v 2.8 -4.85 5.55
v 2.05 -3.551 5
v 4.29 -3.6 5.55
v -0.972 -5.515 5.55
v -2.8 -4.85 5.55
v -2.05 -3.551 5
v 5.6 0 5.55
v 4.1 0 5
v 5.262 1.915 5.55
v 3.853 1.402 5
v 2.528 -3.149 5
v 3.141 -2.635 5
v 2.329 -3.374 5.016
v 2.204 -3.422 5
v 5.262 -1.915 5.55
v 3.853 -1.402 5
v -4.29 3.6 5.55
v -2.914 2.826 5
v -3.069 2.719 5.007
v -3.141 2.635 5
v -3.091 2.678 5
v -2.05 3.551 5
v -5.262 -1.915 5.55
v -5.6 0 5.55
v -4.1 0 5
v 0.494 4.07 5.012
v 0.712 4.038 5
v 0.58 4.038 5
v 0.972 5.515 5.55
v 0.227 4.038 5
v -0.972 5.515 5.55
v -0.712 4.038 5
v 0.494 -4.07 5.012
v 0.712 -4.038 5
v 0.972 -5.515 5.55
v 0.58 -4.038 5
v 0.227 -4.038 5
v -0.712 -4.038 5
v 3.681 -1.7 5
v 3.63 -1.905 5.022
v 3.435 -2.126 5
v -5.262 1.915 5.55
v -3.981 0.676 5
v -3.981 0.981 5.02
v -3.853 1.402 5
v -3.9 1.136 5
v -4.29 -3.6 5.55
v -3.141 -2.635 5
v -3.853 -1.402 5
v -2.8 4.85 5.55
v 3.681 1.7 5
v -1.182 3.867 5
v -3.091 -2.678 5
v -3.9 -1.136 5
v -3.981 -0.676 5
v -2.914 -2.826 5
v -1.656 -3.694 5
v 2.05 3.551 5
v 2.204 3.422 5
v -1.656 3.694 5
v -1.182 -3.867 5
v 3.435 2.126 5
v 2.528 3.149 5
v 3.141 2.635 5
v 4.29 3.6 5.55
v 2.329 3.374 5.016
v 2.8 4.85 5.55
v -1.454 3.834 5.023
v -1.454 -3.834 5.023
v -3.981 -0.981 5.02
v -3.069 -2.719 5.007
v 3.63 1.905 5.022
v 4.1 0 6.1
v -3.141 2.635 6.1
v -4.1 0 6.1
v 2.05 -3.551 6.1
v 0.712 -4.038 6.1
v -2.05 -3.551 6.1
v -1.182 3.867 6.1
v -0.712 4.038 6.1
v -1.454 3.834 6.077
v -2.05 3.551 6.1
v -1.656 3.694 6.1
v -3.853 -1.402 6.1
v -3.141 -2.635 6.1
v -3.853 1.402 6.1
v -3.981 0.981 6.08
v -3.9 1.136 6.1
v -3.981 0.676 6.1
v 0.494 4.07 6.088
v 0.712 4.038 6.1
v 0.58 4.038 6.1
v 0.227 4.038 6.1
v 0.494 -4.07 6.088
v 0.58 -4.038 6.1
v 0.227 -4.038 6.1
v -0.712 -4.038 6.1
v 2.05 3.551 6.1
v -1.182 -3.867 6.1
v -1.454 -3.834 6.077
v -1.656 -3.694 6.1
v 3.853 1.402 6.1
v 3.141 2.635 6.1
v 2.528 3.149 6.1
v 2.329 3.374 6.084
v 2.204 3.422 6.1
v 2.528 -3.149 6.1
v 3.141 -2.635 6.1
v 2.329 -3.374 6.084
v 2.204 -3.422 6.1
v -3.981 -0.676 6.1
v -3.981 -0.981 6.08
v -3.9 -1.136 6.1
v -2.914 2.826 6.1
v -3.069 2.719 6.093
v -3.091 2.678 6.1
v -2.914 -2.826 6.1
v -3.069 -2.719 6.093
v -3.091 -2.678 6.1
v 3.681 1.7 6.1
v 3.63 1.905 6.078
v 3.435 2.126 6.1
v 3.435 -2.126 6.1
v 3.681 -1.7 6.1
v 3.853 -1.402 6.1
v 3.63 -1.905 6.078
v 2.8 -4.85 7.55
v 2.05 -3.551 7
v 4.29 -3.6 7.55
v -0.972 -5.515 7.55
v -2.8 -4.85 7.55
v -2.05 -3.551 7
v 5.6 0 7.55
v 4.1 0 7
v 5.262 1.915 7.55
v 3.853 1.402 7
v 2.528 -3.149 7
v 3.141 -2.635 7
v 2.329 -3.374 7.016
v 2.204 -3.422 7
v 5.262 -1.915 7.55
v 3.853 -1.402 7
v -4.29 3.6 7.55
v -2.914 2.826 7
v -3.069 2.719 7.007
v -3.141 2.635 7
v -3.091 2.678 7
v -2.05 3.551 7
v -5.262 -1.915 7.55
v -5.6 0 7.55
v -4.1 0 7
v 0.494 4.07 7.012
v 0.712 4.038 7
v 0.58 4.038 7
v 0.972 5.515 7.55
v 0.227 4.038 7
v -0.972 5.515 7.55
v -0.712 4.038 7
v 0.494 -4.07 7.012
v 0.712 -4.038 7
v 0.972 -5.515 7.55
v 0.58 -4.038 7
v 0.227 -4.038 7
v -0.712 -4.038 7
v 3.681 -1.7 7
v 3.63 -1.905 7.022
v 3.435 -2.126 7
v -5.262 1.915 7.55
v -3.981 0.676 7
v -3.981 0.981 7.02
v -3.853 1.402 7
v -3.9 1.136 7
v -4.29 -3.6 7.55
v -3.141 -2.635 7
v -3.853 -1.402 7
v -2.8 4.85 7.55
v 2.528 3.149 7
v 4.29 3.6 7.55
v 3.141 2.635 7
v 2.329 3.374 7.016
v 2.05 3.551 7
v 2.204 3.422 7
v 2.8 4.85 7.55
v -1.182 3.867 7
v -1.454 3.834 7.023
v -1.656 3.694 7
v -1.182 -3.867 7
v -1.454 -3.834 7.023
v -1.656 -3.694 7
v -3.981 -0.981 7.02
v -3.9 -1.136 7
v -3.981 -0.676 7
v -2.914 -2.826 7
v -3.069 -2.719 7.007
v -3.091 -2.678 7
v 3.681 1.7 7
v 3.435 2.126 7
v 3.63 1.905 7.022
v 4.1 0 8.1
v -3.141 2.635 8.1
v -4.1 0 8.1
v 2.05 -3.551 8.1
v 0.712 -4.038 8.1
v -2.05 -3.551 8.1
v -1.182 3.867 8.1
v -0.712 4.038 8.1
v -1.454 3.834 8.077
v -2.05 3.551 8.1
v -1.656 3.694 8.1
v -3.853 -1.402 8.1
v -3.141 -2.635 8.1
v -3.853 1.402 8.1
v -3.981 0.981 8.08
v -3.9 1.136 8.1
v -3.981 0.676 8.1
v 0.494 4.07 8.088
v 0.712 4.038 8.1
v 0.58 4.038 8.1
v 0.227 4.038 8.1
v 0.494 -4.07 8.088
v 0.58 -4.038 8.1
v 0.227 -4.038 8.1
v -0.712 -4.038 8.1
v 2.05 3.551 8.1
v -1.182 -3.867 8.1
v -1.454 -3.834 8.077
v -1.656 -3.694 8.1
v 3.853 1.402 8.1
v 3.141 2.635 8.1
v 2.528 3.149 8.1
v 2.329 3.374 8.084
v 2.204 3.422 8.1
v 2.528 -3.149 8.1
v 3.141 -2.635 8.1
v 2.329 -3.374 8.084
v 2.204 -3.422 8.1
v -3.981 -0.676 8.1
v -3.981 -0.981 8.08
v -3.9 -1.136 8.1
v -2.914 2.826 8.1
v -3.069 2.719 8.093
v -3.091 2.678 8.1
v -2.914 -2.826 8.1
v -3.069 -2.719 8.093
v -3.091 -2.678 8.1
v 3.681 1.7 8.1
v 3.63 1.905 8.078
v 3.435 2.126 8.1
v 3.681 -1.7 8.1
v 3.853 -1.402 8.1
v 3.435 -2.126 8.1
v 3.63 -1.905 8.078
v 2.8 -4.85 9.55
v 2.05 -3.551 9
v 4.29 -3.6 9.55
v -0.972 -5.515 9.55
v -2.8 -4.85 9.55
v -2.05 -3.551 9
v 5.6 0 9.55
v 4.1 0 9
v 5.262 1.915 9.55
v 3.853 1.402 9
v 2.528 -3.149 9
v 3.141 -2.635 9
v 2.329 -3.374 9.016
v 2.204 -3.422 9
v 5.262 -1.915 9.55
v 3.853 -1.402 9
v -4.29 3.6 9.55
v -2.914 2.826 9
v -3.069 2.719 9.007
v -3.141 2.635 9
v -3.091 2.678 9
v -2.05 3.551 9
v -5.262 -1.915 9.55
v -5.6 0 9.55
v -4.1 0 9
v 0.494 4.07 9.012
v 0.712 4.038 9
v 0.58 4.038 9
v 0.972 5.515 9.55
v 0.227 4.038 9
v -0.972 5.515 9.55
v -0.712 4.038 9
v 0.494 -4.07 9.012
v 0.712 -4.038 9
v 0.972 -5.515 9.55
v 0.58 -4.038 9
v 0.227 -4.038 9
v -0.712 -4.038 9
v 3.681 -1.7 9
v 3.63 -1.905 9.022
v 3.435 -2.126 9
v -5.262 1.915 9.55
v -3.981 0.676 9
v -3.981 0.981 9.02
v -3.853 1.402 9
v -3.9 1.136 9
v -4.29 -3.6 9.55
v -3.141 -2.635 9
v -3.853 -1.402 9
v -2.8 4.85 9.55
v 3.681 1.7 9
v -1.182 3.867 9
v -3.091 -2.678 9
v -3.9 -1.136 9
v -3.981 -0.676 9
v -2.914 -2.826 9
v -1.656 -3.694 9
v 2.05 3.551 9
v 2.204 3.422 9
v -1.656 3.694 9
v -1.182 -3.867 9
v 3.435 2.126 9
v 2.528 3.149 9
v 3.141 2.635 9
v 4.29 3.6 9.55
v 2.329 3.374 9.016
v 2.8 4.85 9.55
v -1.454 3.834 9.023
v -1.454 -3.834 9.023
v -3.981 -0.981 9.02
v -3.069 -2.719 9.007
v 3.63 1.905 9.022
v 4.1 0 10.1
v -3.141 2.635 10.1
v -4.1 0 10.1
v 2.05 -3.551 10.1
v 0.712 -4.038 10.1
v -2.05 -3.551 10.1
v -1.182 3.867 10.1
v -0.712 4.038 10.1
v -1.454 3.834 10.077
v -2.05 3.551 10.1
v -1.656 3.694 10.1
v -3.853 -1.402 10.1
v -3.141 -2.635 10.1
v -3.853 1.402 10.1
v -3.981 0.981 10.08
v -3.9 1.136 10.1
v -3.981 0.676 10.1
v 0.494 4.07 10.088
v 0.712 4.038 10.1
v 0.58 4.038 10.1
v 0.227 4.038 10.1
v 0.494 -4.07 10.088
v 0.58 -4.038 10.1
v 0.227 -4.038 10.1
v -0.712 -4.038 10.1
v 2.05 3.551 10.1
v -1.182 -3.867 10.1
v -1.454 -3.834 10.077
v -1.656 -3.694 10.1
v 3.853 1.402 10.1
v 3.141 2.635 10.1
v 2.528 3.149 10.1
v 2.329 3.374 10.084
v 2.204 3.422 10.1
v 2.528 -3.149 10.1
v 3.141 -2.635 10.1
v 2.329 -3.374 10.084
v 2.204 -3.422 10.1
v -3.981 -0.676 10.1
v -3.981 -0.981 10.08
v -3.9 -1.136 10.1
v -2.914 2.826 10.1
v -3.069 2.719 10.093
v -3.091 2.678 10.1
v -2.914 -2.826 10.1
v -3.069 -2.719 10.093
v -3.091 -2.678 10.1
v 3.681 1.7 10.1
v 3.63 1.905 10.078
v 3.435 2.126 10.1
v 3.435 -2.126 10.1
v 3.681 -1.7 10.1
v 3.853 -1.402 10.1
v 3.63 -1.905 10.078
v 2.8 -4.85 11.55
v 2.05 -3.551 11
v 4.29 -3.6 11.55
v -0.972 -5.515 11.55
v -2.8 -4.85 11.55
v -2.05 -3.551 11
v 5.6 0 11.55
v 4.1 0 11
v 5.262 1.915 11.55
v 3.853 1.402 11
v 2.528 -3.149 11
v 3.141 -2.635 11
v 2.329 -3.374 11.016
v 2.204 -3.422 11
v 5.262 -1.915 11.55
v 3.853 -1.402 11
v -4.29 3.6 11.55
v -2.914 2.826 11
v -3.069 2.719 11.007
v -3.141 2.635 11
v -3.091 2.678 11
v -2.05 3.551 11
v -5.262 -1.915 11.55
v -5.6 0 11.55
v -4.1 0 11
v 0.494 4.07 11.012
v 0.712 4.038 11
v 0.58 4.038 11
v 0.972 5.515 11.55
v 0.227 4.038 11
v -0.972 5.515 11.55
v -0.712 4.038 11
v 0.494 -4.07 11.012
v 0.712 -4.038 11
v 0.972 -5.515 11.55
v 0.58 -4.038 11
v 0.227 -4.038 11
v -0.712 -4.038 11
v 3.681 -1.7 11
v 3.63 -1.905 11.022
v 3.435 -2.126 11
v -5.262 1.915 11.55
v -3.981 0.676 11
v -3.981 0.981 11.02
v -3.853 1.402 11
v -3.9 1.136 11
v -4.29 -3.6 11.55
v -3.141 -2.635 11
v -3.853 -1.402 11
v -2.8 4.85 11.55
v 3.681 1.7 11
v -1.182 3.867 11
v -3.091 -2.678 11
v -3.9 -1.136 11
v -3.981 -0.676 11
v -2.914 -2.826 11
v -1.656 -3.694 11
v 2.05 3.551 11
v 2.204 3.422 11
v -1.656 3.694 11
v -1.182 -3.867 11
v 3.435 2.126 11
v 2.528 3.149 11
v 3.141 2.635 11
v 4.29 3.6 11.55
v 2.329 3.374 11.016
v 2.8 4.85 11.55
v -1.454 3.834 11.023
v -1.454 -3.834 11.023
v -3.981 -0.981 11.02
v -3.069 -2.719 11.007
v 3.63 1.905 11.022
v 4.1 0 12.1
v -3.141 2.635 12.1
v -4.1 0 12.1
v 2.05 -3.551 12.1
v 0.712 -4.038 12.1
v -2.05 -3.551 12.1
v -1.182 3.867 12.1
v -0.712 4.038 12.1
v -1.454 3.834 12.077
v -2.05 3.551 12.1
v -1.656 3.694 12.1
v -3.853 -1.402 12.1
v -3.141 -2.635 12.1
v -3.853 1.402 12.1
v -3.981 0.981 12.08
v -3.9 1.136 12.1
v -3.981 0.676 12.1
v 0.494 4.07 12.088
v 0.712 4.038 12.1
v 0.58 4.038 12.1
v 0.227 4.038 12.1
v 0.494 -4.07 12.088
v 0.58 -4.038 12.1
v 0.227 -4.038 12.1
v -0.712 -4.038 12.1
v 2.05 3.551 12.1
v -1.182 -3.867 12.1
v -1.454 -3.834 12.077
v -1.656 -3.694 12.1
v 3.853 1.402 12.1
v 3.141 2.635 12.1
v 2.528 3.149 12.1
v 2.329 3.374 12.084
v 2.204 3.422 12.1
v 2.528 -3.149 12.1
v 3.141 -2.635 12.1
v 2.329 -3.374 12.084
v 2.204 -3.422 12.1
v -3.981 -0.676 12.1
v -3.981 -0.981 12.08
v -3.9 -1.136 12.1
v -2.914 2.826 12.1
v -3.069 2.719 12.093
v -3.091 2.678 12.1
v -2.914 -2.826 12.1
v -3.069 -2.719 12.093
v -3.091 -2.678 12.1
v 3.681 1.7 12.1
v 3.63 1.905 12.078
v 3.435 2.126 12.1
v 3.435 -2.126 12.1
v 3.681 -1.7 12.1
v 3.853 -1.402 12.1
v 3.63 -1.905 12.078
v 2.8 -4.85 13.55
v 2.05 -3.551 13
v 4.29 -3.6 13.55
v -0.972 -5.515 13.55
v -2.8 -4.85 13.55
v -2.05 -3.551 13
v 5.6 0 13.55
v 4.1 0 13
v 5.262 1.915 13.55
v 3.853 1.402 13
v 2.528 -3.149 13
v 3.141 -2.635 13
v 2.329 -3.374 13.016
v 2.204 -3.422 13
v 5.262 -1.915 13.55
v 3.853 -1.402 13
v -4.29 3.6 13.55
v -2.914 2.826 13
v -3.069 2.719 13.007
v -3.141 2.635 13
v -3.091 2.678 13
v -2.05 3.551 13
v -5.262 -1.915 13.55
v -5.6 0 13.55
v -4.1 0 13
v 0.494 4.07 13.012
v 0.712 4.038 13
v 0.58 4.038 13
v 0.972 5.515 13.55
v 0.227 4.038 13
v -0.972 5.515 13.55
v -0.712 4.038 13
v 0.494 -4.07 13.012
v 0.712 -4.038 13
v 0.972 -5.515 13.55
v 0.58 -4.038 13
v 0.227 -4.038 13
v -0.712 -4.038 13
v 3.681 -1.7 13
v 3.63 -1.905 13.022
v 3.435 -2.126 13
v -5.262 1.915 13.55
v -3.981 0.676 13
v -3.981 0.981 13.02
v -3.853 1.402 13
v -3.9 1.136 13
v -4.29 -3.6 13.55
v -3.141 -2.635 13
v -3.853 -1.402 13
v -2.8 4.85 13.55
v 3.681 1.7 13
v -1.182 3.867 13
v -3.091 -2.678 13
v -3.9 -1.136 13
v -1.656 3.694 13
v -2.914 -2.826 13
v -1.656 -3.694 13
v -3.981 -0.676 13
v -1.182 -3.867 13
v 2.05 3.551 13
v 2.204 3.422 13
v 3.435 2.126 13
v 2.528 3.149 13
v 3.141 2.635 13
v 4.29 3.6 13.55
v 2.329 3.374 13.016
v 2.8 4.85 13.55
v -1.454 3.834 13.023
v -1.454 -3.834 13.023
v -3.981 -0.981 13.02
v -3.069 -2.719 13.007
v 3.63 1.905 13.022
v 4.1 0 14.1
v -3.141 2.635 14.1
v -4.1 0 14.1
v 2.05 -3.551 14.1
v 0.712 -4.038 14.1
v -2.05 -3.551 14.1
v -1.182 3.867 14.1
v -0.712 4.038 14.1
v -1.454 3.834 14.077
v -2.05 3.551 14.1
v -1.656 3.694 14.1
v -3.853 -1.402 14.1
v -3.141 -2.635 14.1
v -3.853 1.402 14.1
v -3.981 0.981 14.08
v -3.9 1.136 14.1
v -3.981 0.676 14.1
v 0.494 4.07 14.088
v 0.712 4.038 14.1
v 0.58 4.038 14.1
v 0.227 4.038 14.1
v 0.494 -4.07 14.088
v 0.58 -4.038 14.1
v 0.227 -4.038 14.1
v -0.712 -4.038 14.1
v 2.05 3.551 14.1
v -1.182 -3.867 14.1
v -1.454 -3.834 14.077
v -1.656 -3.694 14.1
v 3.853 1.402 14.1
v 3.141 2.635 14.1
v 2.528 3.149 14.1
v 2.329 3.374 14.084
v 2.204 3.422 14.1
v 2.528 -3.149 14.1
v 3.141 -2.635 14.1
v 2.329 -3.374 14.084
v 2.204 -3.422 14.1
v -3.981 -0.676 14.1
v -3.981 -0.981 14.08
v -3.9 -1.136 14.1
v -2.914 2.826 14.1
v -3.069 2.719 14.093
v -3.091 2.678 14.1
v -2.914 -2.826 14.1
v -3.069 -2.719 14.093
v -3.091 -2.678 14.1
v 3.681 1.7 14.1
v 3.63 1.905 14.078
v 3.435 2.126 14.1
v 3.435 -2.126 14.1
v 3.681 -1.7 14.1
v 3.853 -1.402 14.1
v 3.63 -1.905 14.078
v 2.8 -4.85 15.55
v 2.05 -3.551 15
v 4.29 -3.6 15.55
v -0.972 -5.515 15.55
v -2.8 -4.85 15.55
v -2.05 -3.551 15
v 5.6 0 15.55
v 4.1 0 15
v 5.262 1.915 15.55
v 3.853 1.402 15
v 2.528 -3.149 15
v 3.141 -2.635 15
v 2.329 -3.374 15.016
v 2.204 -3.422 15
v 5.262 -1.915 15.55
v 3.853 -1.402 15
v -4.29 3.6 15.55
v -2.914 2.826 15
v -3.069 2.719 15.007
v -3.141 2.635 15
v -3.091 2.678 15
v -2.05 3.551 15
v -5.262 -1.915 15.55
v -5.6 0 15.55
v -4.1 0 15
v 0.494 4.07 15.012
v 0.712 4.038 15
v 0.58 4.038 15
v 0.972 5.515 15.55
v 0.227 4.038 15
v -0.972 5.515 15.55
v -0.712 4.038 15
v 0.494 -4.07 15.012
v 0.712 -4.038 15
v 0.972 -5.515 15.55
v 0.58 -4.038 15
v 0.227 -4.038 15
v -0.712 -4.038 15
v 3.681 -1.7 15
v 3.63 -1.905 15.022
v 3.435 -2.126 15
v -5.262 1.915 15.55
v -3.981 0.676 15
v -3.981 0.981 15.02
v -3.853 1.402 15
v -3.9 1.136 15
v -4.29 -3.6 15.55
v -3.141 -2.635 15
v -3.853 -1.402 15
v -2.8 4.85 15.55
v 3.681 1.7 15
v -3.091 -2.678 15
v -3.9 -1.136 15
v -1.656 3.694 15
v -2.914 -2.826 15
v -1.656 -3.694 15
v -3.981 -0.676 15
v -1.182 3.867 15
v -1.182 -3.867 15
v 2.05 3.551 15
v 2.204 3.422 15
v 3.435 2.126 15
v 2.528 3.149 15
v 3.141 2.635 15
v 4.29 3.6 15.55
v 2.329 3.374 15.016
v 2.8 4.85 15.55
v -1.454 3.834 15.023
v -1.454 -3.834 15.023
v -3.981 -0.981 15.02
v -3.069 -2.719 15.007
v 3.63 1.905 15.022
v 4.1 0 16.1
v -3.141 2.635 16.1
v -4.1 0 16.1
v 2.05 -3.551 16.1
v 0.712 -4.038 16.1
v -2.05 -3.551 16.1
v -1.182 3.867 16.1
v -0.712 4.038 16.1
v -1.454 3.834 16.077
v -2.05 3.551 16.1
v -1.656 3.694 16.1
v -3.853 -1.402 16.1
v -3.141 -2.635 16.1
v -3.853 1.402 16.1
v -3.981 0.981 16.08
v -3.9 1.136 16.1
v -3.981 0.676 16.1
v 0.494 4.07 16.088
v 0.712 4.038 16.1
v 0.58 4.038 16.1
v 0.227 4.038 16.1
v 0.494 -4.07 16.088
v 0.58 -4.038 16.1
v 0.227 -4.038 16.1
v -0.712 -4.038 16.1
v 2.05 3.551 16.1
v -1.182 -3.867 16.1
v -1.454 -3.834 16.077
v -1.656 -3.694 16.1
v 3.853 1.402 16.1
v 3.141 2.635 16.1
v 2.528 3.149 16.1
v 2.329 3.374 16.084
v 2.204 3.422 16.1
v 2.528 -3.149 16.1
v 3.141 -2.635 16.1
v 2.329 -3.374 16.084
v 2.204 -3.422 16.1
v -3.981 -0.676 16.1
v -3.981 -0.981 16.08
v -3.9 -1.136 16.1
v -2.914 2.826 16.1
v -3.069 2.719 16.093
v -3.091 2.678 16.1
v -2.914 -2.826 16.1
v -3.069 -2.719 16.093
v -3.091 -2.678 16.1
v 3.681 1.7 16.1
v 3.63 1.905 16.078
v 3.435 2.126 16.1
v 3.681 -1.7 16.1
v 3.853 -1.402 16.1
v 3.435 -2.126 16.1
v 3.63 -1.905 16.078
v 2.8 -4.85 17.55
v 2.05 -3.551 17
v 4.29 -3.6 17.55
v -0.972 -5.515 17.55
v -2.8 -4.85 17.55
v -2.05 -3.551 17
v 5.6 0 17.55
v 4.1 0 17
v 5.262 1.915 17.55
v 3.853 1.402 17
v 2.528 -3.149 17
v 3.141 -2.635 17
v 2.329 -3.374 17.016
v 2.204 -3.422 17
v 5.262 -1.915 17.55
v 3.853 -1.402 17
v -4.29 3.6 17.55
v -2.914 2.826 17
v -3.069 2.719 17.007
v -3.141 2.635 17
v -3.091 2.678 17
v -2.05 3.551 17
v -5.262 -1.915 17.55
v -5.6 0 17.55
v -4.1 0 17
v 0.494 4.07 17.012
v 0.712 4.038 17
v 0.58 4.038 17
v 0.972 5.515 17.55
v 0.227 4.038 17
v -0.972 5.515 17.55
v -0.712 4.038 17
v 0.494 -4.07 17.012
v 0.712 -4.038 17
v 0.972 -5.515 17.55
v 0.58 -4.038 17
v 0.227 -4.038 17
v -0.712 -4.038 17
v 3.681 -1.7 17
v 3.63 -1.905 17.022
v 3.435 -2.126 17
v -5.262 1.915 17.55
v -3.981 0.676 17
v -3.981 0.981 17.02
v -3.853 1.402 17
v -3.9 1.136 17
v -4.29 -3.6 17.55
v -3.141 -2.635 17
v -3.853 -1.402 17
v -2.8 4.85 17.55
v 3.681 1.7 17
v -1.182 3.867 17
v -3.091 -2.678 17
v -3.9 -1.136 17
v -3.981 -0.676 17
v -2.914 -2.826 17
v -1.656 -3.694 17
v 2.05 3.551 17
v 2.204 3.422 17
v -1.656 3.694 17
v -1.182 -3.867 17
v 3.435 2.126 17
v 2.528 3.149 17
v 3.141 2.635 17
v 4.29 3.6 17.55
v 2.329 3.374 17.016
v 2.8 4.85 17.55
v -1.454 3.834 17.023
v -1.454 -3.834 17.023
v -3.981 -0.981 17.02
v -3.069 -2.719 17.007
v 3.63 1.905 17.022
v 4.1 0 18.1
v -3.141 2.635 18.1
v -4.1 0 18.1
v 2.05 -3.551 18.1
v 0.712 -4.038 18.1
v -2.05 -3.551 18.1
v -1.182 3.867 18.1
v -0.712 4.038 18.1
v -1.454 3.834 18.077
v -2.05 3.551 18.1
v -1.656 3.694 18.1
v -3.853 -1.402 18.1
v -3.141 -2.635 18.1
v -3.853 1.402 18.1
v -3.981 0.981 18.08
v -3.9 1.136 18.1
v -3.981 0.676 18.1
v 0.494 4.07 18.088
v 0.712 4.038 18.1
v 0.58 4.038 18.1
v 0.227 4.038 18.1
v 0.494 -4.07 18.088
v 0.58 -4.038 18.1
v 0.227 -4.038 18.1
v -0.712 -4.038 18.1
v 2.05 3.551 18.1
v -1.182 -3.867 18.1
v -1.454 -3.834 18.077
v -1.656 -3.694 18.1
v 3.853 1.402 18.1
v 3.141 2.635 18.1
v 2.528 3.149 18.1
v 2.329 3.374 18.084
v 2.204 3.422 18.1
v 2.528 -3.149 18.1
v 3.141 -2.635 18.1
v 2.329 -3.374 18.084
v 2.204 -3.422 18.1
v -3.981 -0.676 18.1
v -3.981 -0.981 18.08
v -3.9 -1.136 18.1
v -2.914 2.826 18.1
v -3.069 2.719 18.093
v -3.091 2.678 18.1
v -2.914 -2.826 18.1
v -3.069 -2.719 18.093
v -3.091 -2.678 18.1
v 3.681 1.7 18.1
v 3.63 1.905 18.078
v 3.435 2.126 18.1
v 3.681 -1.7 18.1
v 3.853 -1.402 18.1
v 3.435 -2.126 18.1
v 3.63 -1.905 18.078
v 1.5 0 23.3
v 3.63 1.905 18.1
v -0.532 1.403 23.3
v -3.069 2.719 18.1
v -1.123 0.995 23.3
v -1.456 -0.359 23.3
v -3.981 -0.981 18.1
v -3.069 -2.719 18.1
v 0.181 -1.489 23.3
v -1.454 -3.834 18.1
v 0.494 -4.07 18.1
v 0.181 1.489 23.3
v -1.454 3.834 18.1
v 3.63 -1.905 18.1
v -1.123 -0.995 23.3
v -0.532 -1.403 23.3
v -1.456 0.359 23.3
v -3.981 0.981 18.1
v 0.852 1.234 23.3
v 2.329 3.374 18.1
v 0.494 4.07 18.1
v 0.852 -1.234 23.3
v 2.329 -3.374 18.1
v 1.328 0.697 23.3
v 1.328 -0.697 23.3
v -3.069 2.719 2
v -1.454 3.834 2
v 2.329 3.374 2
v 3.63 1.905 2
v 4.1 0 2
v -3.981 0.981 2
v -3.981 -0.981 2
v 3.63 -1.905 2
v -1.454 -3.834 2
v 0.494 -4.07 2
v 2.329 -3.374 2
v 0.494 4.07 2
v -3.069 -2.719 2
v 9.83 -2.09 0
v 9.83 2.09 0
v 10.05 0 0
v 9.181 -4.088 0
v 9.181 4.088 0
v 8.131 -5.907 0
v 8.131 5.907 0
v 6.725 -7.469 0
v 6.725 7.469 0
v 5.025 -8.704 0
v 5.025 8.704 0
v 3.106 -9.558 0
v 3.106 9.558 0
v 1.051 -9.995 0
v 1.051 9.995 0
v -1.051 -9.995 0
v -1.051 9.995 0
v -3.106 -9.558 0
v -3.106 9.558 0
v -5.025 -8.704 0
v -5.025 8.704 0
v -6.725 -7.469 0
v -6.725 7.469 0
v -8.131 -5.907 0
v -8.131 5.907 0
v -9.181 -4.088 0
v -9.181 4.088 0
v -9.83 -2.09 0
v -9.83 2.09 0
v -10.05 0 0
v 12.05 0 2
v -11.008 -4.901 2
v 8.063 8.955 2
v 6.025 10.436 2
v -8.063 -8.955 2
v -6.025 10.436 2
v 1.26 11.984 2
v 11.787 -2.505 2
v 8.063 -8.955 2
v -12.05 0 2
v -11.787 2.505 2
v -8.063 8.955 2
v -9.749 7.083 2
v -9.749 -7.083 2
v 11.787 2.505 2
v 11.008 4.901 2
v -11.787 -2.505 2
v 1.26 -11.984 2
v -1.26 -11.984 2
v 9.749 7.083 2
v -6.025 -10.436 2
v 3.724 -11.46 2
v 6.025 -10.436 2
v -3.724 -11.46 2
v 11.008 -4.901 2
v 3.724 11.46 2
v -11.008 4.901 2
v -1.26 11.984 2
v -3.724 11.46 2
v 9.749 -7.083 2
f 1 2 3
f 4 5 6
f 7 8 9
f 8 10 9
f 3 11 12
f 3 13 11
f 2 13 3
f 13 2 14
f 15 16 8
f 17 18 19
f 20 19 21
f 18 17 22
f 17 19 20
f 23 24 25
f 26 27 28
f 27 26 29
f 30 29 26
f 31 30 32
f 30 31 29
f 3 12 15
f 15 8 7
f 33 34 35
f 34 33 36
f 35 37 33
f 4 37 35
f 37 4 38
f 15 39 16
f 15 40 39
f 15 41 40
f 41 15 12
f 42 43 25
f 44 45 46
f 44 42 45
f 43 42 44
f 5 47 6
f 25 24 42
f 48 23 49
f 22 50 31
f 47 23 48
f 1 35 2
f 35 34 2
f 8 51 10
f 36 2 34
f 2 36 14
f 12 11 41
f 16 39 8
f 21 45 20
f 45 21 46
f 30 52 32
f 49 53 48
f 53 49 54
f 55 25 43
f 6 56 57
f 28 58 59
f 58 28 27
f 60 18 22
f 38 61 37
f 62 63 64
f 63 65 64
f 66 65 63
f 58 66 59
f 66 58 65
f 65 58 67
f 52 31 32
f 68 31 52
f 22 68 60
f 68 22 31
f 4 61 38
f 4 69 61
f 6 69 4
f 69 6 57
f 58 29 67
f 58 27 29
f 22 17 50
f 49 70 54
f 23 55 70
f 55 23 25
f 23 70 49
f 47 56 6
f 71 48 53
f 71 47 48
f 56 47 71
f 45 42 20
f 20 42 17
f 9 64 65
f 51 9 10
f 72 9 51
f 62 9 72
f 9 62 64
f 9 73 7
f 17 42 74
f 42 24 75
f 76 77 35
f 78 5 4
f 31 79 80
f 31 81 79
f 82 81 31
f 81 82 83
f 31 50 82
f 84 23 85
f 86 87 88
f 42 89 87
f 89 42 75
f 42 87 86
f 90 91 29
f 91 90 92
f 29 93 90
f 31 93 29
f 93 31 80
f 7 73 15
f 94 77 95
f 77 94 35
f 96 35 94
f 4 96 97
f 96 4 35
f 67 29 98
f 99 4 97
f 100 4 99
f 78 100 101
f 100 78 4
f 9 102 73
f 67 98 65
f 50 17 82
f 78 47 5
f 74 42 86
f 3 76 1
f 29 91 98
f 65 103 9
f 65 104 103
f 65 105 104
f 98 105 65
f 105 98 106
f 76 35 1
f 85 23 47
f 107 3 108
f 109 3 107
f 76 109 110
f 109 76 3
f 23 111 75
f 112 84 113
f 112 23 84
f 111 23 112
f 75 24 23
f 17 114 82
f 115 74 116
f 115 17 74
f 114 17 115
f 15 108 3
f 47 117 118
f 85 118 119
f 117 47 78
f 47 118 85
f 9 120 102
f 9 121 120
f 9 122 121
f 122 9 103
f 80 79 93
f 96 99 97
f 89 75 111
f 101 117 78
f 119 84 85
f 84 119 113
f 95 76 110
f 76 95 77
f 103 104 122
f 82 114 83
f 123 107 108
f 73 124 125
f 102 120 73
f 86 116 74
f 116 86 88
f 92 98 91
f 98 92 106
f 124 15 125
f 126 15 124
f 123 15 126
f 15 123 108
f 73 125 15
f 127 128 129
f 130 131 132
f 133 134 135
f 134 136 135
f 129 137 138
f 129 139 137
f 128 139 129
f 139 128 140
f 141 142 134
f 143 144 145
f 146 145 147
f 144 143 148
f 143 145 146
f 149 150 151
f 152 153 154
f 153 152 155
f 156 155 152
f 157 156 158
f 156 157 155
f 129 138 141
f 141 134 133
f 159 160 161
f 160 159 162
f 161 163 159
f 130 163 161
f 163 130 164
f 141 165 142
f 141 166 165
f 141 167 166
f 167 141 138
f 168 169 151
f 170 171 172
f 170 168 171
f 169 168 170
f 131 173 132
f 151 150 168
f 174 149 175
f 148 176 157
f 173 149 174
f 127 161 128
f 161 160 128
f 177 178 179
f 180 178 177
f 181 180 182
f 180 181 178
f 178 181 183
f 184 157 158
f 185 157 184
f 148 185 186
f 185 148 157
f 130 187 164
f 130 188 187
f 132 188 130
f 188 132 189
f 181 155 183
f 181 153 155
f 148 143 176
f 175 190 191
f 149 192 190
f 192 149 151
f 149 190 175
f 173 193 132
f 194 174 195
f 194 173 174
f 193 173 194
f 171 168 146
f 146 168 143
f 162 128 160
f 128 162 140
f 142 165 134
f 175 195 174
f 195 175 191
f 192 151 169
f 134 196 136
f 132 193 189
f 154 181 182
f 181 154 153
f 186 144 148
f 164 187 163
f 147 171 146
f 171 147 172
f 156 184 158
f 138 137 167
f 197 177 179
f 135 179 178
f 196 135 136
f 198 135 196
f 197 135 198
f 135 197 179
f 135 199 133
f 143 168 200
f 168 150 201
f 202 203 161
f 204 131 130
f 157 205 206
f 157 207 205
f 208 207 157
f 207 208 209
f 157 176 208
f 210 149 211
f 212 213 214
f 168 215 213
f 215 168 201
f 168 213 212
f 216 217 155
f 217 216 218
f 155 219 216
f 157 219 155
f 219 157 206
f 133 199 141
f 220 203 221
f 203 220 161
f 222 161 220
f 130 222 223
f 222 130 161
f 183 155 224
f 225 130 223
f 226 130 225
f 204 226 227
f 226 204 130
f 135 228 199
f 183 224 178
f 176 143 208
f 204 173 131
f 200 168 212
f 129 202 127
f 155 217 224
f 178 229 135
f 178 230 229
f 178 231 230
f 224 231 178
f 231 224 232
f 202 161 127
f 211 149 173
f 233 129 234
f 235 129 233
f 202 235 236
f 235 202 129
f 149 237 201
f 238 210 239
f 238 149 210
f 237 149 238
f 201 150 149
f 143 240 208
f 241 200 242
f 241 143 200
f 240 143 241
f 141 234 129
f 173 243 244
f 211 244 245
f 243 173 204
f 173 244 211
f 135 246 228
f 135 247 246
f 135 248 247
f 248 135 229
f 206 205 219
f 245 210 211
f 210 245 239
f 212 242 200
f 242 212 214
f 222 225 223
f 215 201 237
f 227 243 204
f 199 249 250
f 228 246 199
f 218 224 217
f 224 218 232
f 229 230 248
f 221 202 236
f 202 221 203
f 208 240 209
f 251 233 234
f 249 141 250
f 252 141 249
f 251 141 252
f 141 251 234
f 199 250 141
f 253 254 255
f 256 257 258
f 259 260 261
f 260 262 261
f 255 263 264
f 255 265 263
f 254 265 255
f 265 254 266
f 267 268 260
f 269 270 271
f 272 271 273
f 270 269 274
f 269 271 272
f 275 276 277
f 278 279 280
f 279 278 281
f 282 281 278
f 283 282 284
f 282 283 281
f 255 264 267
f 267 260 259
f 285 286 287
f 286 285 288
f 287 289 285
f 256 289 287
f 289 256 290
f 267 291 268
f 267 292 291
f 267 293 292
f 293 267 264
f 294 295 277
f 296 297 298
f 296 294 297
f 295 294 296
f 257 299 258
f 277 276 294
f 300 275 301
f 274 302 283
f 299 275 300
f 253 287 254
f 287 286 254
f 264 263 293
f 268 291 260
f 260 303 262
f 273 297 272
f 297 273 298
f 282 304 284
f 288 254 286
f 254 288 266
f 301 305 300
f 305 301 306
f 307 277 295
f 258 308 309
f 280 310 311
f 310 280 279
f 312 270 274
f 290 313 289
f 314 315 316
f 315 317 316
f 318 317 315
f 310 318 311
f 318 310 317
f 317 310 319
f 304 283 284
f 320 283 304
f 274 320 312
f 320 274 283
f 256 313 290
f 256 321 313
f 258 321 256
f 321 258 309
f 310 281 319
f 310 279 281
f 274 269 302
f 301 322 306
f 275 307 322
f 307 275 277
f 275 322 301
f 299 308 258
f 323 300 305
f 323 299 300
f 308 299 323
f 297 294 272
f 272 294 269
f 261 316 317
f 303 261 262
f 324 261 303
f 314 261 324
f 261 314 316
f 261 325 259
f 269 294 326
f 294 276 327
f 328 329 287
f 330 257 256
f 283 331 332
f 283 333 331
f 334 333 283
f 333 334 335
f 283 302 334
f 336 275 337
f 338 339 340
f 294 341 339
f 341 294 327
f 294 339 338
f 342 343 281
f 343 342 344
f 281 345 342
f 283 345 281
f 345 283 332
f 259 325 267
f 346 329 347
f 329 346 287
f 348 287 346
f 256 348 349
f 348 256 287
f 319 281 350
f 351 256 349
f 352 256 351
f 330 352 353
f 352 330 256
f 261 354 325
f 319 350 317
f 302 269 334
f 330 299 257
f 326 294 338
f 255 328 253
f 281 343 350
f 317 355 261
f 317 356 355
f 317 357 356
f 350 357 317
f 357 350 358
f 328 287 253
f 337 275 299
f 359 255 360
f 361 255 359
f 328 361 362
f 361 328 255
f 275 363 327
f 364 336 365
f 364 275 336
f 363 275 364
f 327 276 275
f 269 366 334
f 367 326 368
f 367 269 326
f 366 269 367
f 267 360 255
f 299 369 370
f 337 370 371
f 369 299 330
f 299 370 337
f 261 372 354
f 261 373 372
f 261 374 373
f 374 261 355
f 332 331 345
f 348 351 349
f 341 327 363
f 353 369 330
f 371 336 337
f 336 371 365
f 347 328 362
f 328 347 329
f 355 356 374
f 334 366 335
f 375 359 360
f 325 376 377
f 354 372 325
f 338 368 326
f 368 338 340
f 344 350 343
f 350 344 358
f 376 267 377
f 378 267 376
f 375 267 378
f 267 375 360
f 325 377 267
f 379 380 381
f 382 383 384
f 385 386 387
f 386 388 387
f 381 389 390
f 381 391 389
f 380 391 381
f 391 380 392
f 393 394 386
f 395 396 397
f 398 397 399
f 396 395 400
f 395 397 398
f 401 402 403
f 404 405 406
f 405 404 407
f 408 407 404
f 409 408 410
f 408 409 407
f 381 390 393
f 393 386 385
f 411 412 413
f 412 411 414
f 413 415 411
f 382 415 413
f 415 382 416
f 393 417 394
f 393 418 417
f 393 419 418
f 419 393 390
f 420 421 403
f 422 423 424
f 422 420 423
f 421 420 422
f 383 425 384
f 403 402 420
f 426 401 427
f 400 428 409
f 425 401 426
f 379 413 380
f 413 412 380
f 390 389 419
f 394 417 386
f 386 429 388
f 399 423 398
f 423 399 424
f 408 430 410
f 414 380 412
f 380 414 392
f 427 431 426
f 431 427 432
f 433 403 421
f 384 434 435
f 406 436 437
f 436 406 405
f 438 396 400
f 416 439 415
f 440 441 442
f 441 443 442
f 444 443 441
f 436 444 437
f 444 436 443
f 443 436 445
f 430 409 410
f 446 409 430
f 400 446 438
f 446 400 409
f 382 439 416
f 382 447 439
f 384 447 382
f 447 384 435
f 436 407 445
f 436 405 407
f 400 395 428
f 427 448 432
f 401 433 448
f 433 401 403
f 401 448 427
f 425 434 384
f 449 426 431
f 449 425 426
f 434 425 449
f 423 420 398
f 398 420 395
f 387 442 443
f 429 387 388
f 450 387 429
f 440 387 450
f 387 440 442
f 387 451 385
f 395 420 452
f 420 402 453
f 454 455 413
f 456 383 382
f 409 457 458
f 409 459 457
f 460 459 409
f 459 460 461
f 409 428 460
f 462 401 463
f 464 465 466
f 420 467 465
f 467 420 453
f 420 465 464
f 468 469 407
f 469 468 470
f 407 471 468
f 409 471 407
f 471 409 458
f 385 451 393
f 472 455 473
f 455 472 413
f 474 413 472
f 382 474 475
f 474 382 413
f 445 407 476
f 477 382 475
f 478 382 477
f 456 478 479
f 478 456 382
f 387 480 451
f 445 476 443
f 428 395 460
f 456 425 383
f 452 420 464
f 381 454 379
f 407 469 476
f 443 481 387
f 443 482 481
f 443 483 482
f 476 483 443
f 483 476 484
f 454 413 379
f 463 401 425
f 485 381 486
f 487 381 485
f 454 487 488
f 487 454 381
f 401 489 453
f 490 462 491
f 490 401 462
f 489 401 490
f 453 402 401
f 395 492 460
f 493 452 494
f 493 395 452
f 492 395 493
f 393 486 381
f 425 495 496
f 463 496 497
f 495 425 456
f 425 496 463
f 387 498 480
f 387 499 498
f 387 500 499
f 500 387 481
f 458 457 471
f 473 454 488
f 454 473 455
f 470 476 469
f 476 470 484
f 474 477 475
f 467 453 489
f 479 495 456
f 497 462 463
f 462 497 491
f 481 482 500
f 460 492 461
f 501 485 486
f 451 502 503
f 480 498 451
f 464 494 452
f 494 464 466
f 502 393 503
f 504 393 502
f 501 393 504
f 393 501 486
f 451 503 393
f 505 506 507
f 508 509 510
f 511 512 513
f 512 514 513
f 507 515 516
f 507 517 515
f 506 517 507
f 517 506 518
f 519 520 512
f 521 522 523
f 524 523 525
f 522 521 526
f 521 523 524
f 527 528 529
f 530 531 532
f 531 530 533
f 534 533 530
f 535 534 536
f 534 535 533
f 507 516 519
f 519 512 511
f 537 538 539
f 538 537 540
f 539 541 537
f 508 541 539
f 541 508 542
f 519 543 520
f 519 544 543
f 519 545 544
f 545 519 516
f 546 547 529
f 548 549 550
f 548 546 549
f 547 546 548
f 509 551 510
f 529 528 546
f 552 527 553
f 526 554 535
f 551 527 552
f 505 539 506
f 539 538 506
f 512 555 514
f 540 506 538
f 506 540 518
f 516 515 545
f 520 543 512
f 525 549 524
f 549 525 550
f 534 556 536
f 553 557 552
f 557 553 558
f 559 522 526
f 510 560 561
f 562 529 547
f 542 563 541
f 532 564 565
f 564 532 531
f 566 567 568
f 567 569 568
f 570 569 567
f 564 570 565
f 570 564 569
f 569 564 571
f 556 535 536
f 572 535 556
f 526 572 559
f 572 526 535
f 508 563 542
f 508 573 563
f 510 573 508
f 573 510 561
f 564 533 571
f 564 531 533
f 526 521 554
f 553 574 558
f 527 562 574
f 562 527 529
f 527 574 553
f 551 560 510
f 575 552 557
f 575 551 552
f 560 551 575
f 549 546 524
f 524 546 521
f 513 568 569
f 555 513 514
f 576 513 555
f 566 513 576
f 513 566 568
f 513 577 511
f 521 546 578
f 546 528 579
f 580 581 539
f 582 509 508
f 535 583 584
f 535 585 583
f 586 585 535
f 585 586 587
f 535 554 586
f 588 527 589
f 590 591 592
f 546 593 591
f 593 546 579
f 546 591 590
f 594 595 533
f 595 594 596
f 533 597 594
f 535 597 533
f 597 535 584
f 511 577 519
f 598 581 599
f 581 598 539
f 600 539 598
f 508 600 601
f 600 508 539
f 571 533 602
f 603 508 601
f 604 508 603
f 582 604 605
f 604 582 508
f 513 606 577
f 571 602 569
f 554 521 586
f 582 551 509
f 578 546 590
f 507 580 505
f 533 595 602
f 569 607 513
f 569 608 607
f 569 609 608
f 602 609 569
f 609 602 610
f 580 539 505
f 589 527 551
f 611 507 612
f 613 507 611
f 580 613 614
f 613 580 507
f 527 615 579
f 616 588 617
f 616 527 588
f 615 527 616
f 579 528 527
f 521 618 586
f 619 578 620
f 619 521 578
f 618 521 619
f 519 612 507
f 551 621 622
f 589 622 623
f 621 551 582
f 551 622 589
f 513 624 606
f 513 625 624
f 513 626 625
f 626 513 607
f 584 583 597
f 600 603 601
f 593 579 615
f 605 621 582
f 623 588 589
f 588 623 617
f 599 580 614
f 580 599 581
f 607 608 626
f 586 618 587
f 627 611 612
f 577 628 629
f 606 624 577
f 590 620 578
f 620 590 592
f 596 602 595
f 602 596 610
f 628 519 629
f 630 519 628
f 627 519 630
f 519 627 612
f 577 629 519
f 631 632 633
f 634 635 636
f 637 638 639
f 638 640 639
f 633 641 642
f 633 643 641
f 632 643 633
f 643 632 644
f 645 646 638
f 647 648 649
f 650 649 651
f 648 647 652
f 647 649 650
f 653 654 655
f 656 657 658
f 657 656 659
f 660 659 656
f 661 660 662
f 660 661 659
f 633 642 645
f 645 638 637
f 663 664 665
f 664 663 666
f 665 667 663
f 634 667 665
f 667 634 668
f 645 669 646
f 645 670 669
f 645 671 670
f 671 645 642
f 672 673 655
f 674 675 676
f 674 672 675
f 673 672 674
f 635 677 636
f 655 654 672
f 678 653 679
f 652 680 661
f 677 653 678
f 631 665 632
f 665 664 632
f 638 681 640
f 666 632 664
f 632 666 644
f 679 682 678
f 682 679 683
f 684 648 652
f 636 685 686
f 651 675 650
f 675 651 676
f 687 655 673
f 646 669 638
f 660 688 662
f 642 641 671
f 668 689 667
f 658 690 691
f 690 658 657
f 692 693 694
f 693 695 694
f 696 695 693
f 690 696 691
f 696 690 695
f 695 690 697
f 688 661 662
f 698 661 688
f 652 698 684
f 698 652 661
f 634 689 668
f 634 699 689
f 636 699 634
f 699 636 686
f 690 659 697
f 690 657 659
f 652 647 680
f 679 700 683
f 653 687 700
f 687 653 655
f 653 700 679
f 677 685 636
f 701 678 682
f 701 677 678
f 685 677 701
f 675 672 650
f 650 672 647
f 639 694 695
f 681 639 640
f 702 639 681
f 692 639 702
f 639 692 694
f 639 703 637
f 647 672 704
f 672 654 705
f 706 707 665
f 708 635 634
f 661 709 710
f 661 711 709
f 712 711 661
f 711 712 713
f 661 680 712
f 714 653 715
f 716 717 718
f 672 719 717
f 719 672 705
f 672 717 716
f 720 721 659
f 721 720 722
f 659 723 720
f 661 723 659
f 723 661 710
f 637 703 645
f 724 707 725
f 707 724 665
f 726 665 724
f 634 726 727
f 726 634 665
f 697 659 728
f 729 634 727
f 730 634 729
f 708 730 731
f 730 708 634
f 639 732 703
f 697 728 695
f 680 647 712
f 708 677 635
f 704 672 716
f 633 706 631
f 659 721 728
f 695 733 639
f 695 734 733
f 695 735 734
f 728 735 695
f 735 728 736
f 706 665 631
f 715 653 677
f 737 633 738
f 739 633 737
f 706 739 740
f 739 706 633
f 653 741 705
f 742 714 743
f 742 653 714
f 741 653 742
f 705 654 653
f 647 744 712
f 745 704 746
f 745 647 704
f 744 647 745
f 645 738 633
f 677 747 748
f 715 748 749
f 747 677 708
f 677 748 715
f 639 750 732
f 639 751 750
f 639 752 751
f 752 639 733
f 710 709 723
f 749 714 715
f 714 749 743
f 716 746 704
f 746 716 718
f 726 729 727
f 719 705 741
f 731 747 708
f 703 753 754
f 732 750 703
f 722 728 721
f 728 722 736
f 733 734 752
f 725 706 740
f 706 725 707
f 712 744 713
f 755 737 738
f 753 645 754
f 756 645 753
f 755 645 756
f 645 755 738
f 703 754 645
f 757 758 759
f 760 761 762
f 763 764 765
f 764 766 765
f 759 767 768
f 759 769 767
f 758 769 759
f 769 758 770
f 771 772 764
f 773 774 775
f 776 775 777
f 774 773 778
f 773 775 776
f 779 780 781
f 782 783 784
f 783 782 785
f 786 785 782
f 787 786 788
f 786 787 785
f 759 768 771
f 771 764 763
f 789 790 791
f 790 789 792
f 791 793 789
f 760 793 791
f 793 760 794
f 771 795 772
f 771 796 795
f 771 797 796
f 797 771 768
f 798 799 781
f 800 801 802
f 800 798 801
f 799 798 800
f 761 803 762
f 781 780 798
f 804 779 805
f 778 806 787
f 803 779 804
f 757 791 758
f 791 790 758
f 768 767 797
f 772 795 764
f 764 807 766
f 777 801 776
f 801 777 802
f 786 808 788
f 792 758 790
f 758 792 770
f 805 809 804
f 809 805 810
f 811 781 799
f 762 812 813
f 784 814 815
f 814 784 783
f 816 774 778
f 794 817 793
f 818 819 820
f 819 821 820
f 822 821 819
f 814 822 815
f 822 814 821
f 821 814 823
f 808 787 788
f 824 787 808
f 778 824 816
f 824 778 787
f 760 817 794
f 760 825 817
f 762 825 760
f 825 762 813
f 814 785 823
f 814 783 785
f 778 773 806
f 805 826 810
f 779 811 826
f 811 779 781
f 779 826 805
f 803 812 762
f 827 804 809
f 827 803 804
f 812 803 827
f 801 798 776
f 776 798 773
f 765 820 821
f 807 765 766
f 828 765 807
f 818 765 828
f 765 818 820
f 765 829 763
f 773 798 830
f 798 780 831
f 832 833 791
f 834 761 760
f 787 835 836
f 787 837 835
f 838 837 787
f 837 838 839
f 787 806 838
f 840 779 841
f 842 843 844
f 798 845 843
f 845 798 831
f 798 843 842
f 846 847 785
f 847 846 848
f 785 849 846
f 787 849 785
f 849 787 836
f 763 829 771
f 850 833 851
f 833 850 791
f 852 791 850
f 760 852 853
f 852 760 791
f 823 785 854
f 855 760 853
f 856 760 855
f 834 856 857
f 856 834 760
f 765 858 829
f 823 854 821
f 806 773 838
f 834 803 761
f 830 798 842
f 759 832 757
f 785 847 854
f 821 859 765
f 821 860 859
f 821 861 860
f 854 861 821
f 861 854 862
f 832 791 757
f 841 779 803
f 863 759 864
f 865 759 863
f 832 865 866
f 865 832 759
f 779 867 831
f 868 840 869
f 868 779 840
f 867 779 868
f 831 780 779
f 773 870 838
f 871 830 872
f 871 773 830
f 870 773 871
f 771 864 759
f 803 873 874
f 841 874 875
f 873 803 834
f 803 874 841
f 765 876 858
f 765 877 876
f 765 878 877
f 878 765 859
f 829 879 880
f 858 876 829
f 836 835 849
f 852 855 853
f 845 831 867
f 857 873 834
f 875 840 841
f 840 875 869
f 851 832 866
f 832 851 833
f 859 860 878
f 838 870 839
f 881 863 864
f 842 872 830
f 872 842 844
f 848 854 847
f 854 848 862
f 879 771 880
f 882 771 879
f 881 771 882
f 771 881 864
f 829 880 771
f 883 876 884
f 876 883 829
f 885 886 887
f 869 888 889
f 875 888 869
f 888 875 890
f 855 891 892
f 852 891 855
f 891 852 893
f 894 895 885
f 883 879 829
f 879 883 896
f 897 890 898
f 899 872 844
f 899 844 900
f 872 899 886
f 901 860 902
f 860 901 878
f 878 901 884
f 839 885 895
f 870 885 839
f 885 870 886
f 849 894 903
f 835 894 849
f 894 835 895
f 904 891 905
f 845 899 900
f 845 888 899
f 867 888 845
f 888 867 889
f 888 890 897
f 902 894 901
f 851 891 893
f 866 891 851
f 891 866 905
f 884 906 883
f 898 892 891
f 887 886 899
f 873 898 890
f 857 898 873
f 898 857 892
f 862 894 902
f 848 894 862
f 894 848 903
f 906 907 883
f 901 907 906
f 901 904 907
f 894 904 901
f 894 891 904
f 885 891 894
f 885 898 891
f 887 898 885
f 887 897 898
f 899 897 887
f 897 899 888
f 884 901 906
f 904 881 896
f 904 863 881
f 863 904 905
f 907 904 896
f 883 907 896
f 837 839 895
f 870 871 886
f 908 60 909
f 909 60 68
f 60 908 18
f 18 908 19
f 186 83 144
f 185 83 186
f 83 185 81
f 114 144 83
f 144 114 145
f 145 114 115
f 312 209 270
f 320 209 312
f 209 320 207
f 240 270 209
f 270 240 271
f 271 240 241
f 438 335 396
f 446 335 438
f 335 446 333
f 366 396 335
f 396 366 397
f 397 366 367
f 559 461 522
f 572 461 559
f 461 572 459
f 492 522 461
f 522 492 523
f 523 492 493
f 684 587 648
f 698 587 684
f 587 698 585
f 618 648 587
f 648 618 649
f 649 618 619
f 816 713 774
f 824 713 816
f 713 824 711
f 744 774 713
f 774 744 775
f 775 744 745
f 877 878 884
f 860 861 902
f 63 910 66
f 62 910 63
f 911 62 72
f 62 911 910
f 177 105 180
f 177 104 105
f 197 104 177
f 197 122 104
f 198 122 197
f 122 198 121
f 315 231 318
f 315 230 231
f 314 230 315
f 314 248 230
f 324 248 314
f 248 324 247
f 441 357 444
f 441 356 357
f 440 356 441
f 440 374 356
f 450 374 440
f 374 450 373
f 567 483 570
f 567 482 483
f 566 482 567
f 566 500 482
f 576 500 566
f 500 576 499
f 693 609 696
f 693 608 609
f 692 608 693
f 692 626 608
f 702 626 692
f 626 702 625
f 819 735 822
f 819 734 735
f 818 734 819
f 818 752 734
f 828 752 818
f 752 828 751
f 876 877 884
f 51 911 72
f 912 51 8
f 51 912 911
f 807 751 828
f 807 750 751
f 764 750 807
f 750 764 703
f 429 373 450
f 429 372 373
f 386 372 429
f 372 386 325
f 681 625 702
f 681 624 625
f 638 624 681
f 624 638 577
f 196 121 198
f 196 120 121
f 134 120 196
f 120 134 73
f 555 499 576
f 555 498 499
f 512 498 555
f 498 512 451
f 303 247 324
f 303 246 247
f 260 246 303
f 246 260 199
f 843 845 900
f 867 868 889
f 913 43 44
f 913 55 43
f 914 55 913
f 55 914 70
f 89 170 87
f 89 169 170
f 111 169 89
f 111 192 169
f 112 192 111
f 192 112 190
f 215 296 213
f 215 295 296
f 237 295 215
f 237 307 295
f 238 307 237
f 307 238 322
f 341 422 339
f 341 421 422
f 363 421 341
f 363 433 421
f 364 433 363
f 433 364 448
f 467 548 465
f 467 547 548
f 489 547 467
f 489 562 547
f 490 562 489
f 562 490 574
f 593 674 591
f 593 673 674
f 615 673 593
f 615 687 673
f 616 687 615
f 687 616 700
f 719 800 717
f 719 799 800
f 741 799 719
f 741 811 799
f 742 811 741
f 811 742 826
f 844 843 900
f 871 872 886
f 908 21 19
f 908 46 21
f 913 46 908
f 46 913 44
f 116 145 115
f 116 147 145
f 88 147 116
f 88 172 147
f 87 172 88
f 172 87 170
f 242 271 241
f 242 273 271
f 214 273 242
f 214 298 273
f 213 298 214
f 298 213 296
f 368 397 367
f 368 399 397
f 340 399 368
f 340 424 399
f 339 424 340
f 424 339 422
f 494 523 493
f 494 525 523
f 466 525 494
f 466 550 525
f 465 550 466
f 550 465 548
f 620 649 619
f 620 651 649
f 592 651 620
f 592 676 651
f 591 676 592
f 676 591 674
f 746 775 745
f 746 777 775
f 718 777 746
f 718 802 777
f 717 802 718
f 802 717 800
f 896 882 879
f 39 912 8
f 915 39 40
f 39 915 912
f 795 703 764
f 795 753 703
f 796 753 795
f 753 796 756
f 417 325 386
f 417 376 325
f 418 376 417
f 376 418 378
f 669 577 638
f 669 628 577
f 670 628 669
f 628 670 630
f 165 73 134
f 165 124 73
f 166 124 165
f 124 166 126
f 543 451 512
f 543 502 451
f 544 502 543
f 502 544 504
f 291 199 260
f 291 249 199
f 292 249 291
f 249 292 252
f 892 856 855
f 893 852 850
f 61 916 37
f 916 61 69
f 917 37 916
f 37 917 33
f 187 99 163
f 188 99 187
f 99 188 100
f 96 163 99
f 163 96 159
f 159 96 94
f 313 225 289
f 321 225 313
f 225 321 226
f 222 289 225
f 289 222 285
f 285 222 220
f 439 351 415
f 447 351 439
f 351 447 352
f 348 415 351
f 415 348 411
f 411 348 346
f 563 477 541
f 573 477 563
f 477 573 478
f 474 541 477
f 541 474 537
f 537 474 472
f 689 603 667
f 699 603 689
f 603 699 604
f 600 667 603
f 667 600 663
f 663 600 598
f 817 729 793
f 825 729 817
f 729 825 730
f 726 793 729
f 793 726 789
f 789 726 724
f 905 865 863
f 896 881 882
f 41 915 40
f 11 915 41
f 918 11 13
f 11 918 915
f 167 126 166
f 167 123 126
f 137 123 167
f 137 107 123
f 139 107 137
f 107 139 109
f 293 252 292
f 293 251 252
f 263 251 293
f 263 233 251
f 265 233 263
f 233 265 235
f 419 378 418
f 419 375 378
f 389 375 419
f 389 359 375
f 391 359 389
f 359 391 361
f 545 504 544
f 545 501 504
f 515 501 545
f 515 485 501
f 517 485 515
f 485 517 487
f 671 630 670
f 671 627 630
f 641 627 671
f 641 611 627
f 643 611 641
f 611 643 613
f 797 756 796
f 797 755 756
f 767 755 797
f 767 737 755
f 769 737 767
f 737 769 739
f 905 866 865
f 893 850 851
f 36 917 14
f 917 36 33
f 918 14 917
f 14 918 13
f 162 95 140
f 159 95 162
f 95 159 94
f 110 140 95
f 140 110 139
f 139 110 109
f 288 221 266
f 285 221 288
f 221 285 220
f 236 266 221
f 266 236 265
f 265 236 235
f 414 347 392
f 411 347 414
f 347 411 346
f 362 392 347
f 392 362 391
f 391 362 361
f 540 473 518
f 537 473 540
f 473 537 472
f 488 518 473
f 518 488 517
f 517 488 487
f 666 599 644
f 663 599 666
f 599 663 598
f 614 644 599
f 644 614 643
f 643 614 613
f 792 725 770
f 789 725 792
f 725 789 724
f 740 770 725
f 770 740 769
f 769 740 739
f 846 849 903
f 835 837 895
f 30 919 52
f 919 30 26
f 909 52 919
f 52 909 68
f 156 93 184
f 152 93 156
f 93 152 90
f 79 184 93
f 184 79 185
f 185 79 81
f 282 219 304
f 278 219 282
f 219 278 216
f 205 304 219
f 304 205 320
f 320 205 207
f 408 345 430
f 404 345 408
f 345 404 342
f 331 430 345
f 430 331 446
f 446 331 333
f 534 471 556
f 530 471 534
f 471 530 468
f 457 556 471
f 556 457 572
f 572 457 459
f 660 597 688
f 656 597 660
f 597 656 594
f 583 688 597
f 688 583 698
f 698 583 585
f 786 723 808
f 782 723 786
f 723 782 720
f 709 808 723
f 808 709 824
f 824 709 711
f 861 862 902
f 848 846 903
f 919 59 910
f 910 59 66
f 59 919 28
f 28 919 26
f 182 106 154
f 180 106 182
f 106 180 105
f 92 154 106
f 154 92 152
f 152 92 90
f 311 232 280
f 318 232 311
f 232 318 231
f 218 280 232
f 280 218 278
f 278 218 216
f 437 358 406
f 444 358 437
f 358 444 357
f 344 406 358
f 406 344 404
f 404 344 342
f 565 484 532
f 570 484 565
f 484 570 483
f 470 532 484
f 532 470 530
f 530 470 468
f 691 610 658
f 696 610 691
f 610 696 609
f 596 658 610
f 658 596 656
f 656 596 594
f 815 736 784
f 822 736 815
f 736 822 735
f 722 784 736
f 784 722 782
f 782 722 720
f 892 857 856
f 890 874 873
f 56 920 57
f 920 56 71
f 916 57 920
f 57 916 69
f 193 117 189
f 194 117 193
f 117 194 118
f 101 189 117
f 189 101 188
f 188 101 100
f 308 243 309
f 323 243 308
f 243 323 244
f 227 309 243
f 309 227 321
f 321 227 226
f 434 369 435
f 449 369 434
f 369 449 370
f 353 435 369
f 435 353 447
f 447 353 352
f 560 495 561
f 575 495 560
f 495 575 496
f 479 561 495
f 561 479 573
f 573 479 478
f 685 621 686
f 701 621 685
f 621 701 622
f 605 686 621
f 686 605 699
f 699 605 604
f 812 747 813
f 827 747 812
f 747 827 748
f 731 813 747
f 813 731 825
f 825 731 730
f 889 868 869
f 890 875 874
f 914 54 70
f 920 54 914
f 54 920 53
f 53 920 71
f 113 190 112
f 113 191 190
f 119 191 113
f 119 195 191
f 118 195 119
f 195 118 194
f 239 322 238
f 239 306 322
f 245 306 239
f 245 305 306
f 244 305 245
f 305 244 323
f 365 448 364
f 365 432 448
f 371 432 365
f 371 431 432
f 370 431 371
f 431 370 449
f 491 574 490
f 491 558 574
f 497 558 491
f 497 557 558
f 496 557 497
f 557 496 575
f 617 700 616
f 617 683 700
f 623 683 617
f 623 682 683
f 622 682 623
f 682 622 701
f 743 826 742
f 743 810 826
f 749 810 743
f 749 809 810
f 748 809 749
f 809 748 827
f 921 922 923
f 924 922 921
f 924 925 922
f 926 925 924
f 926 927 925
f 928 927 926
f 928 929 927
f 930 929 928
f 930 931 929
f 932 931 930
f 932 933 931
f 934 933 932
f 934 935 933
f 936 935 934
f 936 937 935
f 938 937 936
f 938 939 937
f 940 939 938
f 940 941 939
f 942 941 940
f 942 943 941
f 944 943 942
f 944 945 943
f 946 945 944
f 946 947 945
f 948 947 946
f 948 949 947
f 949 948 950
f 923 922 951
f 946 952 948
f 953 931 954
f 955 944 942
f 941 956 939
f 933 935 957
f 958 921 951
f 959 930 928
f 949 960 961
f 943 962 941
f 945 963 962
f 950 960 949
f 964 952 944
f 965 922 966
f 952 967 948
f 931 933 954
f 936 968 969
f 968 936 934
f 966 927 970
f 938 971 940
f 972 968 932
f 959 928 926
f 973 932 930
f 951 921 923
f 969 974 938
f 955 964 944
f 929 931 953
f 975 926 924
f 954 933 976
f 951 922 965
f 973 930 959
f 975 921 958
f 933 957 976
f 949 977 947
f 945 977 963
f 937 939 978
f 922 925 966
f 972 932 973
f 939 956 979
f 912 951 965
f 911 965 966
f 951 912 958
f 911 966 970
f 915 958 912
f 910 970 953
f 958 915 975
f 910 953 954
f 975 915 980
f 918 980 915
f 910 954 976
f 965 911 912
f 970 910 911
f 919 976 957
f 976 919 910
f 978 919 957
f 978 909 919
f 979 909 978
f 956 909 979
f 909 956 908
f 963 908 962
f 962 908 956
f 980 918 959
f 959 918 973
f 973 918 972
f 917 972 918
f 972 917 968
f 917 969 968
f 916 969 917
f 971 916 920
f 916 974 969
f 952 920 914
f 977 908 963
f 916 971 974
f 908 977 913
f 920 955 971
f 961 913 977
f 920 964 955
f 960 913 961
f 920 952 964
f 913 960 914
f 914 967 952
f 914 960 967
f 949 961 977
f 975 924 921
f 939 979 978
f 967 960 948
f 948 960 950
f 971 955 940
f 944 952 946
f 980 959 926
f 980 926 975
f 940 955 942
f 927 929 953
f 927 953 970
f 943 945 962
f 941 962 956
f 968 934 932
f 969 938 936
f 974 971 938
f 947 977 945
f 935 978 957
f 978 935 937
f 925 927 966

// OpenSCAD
//uncoment this for smoother end design
//$fn=90;
length_of_plug=23.3;
plug_dia= 8.2;
plug_rad=plug_dia/2;
head_dia= 24.1;
head_rad= head_dia/2;
dist_start_sml_rings=3; //ditance between large ring and small rings
j=dist_start_sml_rings+2; // add thinkness of head to get spacing
k= 2; // axial distance between small rings on plug
small_ring_thickness=1.1 ;  // max thickness of ring(though pointed
small_ring_diameter=11.2; // max diameter of small rings
small_ring_radius = small_ring_diameter/2;

last_ring_height = length_of_plug-5.2;

union(){
translate([0,0,23.3-5.2])cylinder(r1=plug_rad,r2=(plug_dia-5.2)/2,h=5.2, center = false);
cylinder(r1=plug_rad,r2=plug_rad,h=length_of_plug-5.2, center = false);
cylinder(r1=(head_dia-4)/2 ,r2=head_rad,h=2 ,center = false);

color ("red") {
    for (i=[j:k:last_ring_height]){
        translate([0,0,i])cylinder(r1=plug_rad,r2=small_ring_radius,h=small_ring_thickness/2, center = false);
        translate([0,0,i+small_ring_thickness/2])cylinder(r1=small_ring_radius,r2=plug_rad,h=small_ring_thickness/2, center = false);
    }
}
}
